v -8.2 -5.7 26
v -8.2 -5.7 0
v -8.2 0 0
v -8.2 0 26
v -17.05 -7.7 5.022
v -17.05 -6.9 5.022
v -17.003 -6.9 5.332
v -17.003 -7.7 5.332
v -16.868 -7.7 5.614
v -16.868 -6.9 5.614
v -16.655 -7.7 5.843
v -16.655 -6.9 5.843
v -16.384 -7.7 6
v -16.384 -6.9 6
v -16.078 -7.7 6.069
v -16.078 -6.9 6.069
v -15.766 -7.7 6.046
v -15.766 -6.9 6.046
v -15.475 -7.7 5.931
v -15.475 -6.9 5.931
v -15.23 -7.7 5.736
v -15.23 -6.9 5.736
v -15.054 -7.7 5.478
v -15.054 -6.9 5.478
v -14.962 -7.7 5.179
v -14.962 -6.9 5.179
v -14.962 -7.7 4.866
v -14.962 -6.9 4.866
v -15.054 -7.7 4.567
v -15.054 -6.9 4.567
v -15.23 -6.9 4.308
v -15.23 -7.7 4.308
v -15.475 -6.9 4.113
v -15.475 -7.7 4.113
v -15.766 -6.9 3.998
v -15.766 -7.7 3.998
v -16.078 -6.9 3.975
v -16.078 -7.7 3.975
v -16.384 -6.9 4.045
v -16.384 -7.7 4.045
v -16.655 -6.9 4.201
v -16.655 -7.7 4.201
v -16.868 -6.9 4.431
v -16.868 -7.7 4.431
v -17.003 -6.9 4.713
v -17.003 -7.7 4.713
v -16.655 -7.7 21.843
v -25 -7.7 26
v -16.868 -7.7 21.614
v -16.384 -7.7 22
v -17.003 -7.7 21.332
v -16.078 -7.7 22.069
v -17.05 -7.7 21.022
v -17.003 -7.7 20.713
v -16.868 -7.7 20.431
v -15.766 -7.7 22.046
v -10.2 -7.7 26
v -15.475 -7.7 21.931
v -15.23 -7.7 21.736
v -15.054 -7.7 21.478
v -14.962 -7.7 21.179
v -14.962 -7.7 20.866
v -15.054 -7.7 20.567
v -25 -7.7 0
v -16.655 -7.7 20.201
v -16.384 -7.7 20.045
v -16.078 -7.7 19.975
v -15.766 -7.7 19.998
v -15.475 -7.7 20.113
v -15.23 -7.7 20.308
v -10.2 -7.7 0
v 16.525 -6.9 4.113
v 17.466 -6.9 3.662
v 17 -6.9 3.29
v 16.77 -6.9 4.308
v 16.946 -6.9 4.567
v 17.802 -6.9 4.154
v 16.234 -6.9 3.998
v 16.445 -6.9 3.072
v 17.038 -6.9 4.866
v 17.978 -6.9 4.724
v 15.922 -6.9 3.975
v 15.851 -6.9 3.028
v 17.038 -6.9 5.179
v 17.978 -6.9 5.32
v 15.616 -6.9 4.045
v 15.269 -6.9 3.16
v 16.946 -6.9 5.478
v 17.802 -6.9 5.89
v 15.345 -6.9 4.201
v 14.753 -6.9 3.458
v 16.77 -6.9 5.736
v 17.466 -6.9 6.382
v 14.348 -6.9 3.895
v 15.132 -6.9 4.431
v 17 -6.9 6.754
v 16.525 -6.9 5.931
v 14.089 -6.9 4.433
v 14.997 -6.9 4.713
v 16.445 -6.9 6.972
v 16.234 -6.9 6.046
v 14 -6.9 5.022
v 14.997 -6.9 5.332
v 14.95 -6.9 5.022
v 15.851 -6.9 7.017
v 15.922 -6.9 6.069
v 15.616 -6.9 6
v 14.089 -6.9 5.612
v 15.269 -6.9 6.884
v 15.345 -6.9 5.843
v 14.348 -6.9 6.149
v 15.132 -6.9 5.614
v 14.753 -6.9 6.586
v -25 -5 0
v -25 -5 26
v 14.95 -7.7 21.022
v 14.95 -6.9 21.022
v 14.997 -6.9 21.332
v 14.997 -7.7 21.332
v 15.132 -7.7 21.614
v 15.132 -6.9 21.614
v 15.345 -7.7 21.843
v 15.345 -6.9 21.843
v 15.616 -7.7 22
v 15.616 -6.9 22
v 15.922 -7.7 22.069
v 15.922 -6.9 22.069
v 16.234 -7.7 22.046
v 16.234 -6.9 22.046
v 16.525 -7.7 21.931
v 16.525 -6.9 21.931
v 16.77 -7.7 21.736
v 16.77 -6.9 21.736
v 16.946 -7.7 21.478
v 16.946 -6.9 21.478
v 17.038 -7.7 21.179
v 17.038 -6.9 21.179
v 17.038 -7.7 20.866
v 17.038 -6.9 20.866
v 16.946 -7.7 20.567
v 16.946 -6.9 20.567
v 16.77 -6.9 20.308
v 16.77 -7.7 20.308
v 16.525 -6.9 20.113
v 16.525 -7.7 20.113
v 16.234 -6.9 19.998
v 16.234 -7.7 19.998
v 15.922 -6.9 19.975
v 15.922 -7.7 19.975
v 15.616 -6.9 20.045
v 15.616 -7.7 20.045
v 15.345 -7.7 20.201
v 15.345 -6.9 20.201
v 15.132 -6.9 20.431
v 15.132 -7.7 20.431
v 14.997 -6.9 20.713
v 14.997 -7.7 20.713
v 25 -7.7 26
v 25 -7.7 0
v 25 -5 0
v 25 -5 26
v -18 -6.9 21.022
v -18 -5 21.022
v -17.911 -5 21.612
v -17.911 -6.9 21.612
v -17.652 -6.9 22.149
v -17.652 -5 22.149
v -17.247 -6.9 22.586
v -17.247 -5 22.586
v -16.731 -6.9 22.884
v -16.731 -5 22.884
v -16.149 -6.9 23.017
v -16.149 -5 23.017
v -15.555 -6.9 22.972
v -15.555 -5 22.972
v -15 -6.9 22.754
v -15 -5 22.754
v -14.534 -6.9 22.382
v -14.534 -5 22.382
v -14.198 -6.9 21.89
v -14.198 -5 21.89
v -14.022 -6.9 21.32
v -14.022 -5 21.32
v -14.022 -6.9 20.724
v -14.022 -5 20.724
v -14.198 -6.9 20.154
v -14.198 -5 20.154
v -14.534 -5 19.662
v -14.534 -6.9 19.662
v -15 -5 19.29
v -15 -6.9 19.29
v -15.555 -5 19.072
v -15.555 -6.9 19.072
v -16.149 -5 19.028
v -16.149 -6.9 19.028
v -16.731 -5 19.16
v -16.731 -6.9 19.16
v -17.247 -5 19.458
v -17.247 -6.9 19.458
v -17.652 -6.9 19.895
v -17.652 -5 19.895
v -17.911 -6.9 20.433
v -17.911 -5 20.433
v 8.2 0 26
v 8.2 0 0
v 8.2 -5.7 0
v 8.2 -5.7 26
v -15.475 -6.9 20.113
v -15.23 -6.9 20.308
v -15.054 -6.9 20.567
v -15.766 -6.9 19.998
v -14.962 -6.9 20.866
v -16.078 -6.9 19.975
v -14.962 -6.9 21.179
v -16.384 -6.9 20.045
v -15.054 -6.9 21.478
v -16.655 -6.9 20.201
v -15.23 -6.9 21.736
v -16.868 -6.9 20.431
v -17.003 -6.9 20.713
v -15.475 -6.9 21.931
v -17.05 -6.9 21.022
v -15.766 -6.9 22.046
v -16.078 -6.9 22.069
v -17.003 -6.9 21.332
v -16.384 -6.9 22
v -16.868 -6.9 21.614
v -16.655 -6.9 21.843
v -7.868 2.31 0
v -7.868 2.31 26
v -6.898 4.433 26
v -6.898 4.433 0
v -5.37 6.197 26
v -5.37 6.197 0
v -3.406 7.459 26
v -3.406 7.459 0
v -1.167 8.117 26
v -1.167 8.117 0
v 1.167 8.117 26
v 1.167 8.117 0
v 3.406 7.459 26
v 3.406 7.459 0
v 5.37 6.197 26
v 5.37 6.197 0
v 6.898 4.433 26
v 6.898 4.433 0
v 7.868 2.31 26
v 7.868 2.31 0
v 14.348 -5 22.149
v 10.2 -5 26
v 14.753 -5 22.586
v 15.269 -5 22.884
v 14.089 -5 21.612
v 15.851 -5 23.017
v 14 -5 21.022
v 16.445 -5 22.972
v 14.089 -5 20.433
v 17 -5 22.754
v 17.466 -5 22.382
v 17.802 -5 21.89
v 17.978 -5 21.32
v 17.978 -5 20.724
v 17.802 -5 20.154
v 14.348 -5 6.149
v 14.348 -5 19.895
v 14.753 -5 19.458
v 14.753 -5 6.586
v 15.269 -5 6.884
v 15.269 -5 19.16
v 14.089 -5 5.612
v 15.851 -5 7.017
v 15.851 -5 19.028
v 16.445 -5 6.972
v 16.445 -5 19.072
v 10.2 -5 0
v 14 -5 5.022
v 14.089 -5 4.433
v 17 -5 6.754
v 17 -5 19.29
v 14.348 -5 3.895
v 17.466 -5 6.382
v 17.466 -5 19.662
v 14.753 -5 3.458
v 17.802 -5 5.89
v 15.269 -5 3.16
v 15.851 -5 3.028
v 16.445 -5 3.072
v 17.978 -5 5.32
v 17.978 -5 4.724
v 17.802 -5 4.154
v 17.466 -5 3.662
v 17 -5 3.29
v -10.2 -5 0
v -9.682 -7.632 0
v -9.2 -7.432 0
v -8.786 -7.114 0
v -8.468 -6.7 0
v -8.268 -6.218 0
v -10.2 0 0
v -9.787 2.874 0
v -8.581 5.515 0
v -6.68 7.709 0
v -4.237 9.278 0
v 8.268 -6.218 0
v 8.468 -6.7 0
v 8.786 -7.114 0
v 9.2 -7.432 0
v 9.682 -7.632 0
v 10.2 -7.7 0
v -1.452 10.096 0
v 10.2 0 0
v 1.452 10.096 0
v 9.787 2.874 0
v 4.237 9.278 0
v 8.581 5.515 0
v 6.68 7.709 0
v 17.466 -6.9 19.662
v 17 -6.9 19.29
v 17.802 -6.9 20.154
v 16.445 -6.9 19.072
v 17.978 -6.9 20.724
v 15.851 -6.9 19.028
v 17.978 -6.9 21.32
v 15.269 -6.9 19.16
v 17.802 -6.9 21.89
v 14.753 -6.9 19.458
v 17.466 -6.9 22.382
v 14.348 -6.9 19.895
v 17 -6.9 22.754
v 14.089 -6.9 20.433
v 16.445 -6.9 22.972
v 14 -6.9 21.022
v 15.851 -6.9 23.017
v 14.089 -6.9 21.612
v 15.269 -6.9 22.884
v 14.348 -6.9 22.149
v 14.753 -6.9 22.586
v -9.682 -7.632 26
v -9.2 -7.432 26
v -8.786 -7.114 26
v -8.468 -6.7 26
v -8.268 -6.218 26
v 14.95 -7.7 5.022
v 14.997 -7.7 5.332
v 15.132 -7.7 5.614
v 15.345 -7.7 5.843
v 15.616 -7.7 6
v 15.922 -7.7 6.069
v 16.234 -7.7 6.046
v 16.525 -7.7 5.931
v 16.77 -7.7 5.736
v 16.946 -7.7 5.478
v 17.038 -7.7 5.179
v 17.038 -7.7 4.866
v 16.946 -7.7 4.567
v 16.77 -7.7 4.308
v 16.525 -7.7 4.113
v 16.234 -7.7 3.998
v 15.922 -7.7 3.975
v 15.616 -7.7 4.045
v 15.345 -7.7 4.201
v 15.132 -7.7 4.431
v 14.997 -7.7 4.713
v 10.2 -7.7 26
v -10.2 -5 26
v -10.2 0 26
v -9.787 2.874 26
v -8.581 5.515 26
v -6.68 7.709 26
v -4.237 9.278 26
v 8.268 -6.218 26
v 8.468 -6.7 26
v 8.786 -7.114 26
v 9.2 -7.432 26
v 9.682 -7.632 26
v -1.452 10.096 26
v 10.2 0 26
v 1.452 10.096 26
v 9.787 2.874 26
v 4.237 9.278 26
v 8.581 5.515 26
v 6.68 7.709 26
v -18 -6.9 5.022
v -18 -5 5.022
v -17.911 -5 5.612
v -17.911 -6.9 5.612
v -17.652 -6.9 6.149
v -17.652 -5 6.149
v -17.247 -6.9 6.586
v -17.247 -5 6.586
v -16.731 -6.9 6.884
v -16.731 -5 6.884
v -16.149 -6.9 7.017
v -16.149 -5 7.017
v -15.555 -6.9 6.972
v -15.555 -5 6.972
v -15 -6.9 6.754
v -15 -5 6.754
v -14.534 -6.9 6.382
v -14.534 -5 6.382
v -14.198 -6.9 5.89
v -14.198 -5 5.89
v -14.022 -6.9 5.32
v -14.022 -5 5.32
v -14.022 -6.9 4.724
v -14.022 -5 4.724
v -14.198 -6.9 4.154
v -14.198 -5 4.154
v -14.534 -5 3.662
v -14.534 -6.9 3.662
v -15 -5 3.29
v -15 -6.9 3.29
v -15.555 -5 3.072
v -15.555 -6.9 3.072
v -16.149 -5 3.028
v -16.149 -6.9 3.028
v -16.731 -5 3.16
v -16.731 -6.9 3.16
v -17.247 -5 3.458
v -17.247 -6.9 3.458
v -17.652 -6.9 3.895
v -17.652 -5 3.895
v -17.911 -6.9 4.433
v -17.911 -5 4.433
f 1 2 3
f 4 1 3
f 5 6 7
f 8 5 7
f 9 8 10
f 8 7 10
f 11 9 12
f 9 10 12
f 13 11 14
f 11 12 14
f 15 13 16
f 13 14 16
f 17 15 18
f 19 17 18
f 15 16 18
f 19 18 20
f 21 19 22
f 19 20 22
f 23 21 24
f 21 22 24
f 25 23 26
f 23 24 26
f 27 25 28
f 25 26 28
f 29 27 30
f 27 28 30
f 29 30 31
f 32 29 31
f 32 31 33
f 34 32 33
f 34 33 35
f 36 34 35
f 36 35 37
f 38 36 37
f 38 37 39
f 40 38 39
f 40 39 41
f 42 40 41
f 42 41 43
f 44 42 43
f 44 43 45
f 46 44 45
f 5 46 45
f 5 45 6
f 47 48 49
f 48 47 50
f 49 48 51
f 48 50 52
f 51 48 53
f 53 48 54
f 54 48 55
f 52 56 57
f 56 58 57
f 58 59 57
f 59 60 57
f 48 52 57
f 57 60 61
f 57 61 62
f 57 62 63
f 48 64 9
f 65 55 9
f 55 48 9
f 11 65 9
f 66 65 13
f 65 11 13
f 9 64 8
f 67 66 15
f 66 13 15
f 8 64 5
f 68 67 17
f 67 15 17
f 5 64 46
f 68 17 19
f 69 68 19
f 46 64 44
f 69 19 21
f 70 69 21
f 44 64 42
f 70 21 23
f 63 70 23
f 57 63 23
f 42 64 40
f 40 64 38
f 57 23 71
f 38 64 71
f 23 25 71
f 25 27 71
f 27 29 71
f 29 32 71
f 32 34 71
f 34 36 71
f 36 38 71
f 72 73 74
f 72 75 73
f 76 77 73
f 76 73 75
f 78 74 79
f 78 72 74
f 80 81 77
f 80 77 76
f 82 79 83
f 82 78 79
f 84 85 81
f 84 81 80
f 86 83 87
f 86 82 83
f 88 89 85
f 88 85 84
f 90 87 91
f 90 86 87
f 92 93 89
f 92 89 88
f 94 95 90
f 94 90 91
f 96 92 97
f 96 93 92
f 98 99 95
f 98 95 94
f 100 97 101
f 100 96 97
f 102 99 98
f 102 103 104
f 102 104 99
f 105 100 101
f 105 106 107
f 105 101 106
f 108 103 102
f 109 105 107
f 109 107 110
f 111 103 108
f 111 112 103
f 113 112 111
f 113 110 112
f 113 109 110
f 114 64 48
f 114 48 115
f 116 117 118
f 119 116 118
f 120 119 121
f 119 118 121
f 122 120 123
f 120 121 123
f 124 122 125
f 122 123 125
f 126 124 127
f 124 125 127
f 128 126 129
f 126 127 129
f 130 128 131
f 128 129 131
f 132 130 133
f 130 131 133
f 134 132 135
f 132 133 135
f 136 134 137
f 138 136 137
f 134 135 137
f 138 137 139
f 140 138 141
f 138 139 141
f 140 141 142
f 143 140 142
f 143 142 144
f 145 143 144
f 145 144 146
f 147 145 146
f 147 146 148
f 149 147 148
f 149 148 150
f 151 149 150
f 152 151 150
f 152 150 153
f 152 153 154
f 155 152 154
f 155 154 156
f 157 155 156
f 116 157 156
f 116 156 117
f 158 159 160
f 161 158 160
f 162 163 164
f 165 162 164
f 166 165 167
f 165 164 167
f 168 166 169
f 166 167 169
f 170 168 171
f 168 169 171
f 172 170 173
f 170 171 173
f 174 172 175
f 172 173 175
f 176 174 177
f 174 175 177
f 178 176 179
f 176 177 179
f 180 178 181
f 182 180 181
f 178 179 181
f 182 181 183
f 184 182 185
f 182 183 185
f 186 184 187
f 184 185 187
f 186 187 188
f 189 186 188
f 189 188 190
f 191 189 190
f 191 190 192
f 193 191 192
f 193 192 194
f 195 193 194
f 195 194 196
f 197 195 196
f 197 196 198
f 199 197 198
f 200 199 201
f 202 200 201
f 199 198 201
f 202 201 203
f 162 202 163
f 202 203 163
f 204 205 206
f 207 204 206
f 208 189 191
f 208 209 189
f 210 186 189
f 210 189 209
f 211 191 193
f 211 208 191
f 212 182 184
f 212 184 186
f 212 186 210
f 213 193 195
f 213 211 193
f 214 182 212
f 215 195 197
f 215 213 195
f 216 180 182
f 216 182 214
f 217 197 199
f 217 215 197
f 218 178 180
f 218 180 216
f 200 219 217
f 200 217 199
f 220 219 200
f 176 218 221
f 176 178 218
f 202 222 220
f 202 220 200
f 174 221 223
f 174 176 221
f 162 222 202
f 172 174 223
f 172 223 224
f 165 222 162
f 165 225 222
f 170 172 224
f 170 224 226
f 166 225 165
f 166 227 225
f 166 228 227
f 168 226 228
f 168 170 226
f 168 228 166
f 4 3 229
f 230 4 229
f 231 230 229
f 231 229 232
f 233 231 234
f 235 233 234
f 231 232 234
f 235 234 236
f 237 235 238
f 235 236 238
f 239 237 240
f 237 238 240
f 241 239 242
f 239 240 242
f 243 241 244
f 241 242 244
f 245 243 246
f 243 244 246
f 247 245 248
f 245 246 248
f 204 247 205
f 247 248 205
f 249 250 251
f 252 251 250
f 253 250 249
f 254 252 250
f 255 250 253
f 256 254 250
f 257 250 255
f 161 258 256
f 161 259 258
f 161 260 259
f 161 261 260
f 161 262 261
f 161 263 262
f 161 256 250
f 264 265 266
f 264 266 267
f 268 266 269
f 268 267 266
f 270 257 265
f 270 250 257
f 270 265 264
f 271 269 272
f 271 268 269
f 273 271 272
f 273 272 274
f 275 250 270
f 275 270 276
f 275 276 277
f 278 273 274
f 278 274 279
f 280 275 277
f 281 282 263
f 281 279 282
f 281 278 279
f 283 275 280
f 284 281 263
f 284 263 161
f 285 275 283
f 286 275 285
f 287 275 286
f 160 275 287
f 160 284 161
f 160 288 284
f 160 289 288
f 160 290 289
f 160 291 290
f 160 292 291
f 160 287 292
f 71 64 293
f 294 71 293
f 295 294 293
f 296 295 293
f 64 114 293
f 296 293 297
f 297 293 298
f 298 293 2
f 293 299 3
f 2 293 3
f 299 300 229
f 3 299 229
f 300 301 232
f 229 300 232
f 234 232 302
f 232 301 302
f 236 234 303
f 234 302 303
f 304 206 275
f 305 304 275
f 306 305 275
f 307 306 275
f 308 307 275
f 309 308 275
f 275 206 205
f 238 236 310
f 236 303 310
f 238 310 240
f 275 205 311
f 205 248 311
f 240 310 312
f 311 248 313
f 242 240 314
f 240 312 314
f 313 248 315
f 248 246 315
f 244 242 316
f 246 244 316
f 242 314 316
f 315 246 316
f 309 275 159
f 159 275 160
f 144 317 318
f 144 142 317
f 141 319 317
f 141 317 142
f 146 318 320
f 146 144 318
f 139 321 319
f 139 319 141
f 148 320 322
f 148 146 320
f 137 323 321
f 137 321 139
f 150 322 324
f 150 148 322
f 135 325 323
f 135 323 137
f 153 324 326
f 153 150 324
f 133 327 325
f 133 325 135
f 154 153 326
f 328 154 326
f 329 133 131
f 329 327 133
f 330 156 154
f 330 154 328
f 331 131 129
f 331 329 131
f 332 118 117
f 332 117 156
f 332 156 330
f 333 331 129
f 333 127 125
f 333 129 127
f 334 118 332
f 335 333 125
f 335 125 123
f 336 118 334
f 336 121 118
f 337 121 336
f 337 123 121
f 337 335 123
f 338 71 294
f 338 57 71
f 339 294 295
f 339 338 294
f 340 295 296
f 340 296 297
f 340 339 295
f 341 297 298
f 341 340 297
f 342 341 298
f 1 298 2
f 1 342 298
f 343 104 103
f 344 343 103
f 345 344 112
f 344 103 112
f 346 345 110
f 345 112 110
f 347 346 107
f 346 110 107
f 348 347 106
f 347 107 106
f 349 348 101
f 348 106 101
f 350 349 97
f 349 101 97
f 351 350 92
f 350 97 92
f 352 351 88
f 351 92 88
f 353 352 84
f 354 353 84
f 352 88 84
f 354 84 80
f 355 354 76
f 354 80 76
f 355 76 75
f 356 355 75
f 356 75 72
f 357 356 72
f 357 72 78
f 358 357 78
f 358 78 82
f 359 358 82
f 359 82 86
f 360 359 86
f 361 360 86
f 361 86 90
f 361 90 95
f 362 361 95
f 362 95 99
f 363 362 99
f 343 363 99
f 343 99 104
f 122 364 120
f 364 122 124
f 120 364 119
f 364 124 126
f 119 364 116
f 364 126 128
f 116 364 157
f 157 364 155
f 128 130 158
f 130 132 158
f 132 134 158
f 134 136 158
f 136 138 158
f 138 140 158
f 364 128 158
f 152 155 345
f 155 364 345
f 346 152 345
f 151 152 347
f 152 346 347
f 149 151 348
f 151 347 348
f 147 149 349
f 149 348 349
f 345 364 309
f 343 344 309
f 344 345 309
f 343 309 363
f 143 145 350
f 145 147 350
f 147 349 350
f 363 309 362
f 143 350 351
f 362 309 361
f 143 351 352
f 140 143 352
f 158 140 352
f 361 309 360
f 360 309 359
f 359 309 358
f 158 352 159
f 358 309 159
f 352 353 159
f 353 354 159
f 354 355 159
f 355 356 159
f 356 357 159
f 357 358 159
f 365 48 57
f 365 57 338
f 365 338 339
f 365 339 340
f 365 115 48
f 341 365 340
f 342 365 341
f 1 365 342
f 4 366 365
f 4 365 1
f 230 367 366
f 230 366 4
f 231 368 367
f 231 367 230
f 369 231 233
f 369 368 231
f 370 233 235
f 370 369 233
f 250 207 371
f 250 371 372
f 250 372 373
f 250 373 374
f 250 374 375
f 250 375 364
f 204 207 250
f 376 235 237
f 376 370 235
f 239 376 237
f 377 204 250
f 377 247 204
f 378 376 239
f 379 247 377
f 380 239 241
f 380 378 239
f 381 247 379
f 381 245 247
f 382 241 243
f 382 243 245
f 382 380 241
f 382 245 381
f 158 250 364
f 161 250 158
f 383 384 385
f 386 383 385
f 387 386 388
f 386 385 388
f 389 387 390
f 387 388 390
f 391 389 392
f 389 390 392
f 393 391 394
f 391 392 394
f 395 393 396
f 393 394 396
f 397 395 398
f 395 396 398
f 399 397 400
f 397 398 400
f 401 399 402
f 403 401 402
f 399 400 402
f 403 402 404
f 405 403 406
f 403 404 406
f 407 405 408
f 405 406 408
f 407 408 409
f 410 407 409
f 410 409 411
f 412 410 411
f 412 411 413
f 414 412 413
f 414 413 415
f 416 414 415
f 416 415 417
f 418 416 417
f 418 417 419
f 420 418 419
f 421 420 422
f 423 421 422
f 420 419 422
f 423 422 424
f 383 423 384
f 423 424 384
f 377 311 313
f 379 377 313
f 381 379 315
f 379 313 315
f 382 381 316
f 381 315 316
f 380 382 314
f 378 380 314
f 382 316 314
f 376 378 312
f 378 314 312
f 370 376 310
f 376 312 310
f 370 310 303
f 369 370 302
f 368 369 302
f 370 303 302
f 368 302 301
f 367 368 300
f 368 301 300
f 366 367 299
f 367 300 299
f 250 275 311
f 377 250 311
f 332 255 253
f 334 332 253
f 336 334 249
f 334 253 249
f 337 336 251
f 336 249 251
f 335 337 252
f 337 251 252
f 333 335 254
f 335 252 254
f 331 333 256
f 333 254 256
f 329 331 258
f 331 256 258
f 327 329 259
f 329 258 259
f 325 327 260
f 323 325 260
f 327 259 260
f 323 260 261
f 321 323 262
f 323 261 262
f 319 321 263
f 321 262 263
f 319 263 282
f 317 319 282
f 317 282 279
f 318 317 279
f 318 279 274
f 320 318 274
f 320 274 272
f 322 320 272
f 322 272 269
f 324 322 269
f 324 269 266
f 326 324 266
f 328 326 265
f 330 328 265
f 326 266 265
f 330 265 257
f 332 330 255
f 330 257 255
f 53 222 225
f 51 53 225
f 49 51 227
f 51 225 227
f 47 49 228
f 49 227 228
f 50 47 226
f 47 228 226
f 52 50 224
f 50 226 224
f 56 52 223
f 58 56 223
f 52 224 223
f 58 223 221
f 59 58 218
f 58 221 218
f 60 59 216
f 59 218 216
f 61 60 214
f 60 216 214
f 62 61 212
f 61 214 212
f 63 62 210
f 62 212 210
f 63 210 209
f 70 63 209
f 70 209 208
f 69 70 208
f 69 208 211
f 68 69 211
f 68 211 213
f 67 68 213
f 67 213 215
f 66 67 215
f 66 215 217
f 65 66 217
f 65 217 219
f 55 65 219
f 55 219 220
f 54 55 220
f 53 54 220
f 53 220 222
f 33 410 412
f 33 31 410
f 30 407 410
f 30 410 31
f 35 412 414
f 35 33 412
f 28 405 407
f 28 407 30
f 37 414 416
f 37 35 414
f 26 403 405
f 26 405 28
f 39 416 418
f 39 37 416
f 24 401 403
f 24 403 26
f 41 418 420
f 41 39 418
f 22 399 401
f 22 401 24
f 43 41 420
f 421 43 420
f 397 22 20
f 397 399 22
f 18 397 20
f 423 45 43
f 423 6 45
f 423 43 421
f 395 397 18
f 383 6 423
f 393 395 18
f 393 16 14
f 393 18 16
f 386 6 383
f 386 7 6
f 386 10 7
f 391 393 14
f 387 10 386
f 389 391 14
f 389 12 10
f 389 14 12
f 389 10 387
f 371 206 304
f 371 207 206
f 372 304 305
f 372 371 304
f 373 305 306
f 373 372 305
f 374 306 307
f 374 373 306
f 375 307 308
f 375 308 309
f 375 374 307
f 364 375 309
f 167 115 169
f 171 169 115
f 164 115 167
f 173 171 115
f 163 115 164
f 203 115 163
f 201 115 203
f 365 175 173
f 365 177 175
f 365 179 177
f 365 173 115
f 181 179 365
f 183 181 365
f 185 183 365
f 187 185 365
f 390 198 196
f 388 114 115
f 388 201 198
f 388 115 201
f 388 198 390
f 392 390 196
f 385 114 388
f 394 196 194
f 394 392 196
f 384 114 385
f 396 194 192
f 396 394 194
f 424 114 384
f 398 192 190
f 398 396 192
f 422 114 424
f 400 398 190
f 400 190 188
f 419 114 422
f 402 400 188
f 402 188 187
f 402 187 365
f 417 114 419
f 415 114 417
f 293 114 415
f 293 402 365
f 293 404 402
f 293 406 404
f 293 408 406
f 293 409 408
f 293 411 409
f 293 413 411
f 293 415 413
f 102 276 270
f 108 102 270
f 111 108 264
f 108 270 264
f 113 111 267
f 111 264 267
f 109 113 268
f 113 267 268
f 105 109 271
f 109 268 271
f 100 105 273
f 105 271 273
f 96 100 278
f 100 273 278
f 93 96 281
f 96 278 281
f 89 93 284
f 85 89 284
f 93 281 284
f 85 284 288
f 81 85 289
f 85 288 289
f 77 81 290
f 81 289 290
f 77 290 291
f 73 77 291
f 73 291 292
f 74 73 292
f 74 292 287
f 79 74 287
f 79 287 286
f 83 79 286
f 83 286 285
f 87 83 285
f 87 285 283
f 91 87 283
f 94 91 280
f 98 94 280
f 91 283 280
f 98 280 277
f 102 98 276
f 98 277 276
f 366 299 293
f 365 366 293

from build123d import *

# Parameters (mm, degrees)
BOSS_EXTRUDE3_DEPTH = 26
SKETCH4_R           = 1.05
CUT_EXTRUDE1_DEPTH  = 40.141282554
SKETCH5_R           = 2
CUT_EXTRUDE2_DEPTH  = 1.9
FILLET2_R           = 2


with BuildPart() as part:
    # Sketch3 → Boss-Extrude3 (new body)
    with BuildSketch(Plane.XY):
        with BuildLine():
            Line((-25, -5), (-25, -7.7))
            Line((-25, -7.7), (-8.2, -7.7))
            Line((-8.2, -7.7), (-8.2, 0))
            ThreePointArc((-8.2, 0), (0, 8.2), (8.2, 0))
            Line((8.2, 0), (8.2, -7.7))
            Line((8.2, -7.7), (25, -7.7))
            Line((25, -7.7), (25, -5))
            Line((25, -5), (10.2, -5))
            Line((10.2, -5), (10.2, 0))
            ThreePointArc((10.2, 0), (0, 10.2), (-10.2, 0))
            Line((-10.2, 0), (-10.2, -5))
            Line((-10.2, -5), (-25, -5))
        make_face()
    extrude(amount=BOSS_EXTRUDE3_DEPTH)

    # Sketch4 → Cut-Extrude1 (cut, through all)
    with BuildSketch(Plane(origin=(0, -5, 0), x_dir=(1, 0, 0), z_dir=(0, 1, 0))):
        with Locations((-16, -5.022119535)):
            Circle(SKETCH4_R)
        with Locations((16, -5.022119535)):
            Circle(SKETCH4_R)
        with Locations((16, -21.022119535)):
            Circle(SKETCH4_R)
        with Locations((-16, -21.022119535)):
            Circle(SKETCH4_R)
    extrude(amount=-CUT_EXTRUDE1_DEPTH, mode=Mode.SUBTRACT)

    # Sketch5 → Cut-Extrude2 (cut)
    with BuildSketch(Plane(origin=(0, -5, 0), x_dir=(1, 0, 0), z_dir=(0, 1, 0))):
        with Locations((-16, -5.022119535)):
            Circle(SKETCH5_R)
        with Locations((16, -5.022119535)):
            Circle(SKETCH5_R)
        with Locations((16, -21.022119535)):
            Circle(SKETCH5_R)
        with Locations((-16, -21.022119535)):
            Circle(SKETCH5_R)
    extrude(amount=-CUT_EXTRUDE2_DEPTH, mode=Mode.SUBTRACT)

    # Fillet2
    fillet2_edges = [part.edges().sort_by_distance(p)[0] for p in [
        (-8.2, -7.7, 13),
        (8.2, -7.7, 13),
    ]]
    fillet(fillet2_edges, radius=FILLET2_R)


solid = part.part
